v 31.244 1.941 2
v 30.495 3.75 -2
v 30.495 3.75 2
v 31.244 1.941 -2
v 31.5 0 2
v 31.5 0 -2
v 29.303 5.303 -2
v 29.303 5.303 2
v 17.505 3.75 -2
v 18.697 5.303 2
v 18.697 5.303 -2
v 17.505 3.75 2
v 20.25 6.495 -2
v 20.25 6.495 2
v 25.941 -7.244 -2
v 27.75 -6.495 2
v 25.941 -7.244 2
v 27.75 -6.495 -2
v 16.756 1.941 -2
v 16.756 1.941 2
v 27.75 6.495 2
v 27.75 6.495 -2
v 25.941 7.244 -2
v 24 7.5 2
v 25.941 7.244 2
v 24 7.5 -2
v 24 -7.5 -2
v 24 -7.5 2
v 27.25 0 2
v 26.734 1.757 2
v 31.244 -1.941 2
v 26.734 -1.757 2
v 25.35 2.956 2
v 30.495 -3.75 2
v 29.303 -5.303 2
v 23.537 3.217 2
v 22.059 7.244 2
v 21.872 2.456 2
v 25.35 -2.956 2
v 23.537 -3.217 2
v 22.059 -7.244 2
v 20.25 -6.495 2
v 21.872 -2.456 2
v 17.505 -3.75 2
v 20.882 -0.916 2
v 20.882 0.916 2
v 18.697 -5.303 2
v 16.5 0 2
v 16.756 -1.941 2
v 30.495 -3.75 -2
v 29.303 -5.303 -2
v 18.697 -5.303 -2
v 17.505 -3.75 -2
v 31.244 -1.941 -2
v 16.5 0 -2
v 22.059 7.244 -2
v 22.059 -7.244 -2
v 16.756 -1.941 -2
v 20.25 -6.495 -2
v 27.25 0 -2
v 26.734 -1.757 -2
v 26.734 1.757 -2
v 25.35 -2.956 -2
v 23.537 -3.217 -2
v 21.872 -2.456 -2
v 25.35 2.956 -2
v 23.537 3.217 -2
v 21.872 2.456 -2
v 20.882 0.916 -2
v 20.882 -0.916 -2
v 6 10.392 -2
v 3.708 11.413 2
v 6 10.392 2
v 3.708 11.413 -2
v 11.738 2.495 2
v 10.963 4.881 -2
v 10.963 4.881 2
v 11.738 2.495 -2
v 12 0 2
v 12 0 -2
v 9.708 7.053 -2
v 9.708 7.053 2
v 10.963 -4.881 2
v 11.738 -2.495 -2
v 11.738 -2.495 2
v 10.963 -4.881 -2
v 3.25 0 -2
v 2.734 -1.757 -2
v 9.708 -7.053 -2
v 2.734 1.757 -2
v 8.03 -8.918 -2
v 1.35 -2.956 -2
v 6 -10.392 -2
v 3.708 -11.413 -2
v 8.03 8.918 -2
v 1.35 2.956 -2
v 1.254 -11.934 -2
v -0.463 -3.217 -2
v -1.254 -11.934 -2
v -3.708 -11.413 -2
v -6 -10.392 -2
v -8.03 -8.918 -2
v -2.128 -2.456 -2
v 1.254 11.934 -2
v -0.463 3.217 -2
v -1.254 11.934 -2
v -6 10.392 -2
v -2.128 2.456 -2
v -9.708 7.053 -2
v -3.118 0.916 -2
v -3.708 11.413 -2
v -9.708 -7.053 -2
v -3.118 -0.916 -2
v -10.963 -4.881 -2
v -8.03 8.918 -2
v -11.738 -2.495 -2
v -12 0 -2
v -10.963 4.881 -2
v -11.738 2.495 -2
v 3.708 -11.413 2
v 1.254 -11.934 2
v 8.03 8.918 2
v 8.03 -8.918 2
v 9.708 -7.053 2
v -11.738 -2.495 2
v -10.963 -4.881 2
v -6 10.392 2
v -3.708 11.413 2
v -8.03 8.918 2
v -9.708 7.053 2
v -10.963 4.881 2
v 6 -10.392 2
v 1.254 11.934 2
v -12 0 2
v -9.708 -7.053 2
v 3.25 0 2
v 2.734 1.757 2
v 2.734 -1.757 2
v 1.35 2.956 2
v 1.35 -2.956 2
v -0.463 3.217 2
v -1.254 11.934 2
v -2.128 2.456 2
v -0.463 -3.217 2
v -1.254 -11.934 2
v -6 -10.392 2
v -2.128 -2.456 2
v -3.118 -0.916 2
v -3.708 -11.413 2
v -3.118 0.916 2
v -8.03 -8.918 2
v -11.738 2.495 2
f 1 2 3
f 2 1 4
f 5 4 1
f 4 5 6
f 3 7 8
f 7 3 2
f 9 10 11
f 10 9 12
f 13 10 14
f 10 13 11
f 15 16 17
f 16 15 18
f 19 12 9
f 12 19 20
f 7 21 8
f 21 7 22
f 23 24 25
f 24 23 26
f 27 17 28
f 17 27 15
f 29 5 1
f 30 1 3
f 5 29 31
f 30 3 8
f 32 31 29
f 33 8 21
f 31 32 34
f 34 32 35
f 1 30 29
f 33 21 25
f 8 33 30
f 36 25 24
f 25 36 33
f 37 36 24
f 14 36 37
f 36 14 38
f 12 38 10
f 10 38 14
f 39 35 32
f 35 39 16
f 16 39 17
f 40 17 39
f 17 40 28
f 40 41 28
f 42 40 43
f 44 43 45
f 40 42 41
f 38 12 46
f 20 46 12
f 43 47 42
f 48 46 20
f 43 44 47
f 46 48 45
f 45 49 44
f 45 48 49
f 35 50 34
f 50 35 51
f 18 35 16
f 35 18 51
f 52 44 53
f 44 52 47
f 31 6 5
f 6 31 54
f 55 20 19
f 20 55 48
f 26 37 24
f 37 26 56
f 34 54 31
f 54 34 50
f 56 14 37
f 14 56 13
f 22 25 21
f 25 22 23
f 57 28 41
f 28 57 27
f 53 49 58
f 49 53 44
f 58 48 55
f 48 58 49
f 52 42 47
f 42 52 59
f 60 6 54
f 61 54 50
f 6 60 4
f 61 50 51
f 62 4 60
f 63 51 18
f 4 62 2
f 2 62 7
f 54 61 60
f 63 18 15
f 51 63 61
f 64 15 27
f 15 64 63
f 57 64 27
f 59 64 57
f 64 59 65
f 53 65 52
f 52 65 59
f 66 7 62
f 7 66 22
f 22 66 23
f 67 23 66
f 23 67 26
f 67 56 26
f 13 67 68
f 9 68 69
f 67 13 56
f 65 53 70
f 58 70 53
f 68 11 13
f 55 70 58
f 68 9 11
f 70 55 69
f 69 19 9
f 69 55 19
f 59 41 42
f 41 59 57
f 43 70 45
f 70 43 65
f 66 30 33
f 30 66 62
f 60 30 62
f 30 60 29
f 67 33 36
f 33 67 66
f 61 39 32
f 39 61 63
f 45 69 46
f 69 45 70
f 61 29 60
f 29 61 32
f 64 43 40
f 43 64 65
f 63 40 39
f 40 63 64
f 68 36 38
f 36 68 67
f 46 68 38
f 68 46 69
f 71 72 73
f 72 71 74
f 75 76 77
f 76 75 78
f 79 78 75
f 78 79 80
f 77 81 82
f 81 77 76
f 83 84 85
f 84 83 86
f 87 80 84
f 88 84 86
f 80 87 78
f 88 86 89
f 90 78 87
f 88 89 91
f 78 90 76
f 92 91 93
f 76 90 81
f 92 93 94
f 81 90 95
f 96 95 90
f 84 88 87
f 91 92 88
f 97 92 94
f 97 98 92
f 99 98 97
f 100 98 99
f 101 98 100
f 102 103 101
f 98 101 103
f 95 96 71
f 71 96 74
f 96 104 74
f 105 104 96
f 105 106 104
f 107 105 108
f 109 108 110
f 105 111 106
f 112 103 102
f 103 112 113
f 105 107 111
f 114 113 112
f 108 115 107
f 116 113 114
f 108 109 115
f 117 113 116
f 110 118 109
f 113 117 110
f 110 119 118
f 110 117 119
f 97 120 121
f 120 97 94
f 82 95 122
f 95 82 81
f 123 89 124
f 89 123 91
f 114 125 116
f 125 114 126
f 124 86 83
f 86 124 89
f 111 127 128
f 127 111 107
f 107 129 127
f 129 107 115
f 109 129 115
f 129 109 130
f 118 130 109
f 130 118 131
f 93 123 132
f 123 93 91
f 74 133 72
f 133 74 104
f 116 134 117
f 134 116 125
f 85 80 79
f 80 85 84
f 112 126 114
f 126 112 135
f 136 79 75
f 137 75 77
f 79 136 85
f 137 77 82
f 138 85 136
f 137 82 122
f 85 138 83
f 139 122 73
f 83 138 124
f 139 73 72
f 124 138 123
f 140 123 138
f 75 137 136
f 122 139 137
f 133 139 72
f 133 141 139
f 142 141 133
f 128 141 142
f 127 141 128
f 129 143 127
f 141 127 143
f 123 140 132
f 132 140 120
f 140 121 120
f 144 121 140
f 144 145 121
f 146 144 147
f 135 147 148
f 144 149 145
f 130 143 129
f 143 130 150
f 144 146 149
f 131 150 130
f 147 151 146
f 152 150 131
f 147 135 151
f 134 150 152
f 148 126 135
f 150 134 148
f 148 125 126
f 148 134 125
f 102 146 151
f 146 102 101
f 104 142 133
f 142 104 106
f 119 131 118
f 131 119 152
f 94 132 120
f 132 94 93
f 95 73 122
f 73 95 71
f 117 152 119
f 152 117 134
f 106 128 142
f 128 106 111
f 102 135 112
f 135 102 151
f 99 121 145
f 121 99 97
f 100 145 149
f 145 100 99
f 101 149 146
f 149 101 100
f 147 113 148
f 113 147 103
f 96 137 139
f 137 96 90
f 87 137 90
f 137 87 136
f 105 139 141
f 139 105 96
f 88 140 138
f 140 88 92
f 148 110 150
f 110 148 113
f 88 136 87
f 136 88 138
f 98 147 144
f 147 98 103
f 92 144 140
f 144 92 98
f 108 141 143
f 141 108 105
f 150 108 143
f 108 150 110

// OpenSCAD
d_small_nut = 15;
d_big_nut = 24;
h_nut = 4;


translate([d_big_nut, 0, 0])
nut_small();
nut_big();

module nut_small(){
    difference(){
        cylinder (d=d_small_nut, h=h_nut, center=true);
        cylinder(h=40, d=6.5, center=true);
    }
}

module nut_big() {
    difference(){
        cylinder (d=d_big_nut, h=h_nut, center=true);
         cylinder(h=40, d=6.5, center=true);
    }
}
